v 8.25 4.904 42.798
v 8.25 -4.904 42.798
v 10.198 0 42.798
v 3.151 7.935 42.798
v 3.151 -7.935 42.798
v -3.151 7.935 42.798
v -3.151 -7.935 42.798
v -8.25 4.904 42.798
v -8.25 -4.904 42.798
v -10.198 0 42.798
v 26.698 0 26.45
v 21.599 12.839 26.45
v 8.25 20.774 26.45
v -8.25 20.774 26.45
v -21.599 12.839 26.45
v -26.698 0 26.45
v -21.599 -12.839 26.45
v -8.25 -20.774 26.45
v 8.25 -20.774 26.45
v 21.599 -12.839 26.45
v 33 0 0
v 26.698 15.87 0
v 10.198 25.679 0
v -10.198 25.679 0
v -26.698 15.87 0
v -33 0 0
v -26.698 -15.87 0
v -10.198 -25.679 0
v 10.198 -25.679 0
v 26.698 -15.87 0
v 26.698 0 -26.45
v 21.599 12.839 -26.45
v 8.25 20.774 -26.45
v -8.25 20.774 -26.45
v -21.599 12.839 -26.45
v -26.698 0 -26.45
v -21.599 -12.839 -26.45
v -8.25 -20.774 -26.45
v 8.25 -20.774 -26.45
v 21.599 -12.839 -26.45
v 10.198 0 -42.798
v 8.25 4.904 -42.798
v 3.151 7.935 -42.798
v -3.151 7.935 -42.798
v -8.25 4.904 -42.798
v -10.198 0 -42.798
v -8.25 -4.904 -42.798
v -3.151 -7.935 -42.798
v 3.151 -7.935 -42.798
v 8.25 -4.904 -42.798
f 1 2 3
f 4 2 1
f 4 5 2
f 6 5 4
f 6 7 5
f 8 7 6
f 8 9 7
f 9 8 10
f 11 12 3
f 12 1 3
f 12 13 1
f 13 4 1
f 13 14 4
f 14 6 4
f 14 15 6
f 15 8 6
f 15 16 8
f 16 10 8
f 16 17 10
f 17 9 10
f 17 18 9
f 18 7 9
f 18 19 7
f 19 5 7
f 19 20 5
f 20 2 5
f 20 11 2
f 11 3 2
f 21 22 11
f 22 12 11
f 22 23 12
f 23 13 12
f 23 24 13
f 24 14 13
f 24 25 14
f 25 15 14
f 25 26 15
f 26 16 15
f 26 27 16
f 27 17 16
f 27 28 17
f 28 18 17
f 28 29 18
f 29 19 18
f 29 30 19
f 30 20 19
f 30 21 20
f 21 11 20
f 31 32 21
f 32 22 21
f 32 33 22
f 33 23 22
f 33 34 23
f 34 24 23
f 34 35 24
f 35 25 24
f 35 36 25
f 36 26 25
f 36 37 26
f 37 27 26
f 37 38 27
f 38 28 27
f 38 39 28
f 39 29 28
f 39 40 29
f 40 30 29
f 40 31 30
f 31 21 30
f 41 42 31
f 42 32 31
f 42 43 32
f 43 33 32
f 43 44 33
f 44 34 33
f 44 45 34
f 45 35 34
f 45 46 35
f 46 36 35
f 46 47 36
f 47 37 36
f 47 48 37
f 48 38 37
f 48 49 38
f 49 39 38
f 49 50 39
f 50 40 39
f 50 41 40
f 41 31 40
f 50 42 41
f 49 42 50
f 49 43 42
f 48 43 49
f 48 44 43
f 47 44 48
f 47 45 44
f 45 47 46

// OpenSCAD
// Generated by SolidPython 1.0.1 on 2020-07-29 00:46:49


scale(v = [11, 9, 15]) {
	sphere(r = 3);
}
/***********************************************
*********      SolidPython code:      **********
************************************************
 
# import packages: SolidPython
from solid import *
from solid.utils import *
from itertools import chain, combinations, permutations


class Resize:

    def __init__(self, scad_file):
        self.scad_file = scad_file
        #self.scad_file = import_scad(scad_file)
        # cone/cylinder param:
        self.r1 = 0
        self.r2 = 0
        self.h = 0
        # rectangular prism param:
        self.w = 0
        self.l = 0
        # ellipse param:
        self.r = 0

    # import OpenScad code (file name corresponds to shape)


    # classify shape + parameters
    def assign(self, param1, param2, param3):
        if self.scad_file == 'cone.scad':
            self.r1 = param1
            self.r2 = param2
            self.h = param3
        elif self.scad_file == 'cylinder.scad':
            self.r1 = param1
            self.r2 = param2
            self.h = param3
        elif self.scad_file == 'rectangularPrism.scad':
            self.h = param1
            self.l = param2
            self.w = param3
        else:
            self.r = param1
            self.h = param2

    # resize parameters
    def iterate(self):
        x = range(3, 20, 2)
        i = 1
        if self.scad_file == 'cone.scad':
            tempList = list(permutations(x, 2))
            for temp in tempList:
                param1 = temp[0]
                param2 = temp[1]
                filepath = 'produced_scad_files/' + 'cone' + str(param1) + '_' + str(param2) + '_' + '.scad'
                scad_render_to_file(cylinder(h=param1, r1=param2, r2=0), filepath)

        elif self.scad_file == 'cylinder.scad':
            tempList = list(permutations(x, 3))
            for temp in tempList:
                param1 = temp[0]
                param2 = temp[1]
                filepath = 'produced_scad_files/' + 'cylinder' + str(param1) + '_' + str(param2) + '_' + '.scad'
                scad_render_to_file(cylinder(h=param1, r1=param2, r2=param2), filepath)

        elif self.scad_file == 'rectangularPrism.scad':
            tempList = list(permutations(x, 3))
            for temp in tempList:
                param1 = temp[0]
                param2 = temp[1]
                param3 = temp[2]
                filepath = 'produced_scad_files/' + 'rectangularPrism' + str(param1) + '_' + str(param2) + '_' + str(
                    param3) + '.scad'
                scad_render_to_file(cube(size=(param1, param2, param3)), filepath)

        elif self.scad_file == 'ellipse.scad':
            tempList = list(permutations(x, 4))
            for temp in tempList:
                param1 = temp[0]
                param2 = temp[1]
                param3 = temp[2]
                param4 = temp[3]
                filepath = 'produced_scad_files/' + 'ellipse' + str(param1) + '_' + str(param2) + '_' + str(param3) + '_' + str(param4) + '.scad'
                scad_render_to_file(scale([param1, param2, param3])(sphere(r=param4)), filepath)

    def render_to_scadfile(self):
        scad_render_to_file(scad, 'example.scad') 
 
************************************************/
